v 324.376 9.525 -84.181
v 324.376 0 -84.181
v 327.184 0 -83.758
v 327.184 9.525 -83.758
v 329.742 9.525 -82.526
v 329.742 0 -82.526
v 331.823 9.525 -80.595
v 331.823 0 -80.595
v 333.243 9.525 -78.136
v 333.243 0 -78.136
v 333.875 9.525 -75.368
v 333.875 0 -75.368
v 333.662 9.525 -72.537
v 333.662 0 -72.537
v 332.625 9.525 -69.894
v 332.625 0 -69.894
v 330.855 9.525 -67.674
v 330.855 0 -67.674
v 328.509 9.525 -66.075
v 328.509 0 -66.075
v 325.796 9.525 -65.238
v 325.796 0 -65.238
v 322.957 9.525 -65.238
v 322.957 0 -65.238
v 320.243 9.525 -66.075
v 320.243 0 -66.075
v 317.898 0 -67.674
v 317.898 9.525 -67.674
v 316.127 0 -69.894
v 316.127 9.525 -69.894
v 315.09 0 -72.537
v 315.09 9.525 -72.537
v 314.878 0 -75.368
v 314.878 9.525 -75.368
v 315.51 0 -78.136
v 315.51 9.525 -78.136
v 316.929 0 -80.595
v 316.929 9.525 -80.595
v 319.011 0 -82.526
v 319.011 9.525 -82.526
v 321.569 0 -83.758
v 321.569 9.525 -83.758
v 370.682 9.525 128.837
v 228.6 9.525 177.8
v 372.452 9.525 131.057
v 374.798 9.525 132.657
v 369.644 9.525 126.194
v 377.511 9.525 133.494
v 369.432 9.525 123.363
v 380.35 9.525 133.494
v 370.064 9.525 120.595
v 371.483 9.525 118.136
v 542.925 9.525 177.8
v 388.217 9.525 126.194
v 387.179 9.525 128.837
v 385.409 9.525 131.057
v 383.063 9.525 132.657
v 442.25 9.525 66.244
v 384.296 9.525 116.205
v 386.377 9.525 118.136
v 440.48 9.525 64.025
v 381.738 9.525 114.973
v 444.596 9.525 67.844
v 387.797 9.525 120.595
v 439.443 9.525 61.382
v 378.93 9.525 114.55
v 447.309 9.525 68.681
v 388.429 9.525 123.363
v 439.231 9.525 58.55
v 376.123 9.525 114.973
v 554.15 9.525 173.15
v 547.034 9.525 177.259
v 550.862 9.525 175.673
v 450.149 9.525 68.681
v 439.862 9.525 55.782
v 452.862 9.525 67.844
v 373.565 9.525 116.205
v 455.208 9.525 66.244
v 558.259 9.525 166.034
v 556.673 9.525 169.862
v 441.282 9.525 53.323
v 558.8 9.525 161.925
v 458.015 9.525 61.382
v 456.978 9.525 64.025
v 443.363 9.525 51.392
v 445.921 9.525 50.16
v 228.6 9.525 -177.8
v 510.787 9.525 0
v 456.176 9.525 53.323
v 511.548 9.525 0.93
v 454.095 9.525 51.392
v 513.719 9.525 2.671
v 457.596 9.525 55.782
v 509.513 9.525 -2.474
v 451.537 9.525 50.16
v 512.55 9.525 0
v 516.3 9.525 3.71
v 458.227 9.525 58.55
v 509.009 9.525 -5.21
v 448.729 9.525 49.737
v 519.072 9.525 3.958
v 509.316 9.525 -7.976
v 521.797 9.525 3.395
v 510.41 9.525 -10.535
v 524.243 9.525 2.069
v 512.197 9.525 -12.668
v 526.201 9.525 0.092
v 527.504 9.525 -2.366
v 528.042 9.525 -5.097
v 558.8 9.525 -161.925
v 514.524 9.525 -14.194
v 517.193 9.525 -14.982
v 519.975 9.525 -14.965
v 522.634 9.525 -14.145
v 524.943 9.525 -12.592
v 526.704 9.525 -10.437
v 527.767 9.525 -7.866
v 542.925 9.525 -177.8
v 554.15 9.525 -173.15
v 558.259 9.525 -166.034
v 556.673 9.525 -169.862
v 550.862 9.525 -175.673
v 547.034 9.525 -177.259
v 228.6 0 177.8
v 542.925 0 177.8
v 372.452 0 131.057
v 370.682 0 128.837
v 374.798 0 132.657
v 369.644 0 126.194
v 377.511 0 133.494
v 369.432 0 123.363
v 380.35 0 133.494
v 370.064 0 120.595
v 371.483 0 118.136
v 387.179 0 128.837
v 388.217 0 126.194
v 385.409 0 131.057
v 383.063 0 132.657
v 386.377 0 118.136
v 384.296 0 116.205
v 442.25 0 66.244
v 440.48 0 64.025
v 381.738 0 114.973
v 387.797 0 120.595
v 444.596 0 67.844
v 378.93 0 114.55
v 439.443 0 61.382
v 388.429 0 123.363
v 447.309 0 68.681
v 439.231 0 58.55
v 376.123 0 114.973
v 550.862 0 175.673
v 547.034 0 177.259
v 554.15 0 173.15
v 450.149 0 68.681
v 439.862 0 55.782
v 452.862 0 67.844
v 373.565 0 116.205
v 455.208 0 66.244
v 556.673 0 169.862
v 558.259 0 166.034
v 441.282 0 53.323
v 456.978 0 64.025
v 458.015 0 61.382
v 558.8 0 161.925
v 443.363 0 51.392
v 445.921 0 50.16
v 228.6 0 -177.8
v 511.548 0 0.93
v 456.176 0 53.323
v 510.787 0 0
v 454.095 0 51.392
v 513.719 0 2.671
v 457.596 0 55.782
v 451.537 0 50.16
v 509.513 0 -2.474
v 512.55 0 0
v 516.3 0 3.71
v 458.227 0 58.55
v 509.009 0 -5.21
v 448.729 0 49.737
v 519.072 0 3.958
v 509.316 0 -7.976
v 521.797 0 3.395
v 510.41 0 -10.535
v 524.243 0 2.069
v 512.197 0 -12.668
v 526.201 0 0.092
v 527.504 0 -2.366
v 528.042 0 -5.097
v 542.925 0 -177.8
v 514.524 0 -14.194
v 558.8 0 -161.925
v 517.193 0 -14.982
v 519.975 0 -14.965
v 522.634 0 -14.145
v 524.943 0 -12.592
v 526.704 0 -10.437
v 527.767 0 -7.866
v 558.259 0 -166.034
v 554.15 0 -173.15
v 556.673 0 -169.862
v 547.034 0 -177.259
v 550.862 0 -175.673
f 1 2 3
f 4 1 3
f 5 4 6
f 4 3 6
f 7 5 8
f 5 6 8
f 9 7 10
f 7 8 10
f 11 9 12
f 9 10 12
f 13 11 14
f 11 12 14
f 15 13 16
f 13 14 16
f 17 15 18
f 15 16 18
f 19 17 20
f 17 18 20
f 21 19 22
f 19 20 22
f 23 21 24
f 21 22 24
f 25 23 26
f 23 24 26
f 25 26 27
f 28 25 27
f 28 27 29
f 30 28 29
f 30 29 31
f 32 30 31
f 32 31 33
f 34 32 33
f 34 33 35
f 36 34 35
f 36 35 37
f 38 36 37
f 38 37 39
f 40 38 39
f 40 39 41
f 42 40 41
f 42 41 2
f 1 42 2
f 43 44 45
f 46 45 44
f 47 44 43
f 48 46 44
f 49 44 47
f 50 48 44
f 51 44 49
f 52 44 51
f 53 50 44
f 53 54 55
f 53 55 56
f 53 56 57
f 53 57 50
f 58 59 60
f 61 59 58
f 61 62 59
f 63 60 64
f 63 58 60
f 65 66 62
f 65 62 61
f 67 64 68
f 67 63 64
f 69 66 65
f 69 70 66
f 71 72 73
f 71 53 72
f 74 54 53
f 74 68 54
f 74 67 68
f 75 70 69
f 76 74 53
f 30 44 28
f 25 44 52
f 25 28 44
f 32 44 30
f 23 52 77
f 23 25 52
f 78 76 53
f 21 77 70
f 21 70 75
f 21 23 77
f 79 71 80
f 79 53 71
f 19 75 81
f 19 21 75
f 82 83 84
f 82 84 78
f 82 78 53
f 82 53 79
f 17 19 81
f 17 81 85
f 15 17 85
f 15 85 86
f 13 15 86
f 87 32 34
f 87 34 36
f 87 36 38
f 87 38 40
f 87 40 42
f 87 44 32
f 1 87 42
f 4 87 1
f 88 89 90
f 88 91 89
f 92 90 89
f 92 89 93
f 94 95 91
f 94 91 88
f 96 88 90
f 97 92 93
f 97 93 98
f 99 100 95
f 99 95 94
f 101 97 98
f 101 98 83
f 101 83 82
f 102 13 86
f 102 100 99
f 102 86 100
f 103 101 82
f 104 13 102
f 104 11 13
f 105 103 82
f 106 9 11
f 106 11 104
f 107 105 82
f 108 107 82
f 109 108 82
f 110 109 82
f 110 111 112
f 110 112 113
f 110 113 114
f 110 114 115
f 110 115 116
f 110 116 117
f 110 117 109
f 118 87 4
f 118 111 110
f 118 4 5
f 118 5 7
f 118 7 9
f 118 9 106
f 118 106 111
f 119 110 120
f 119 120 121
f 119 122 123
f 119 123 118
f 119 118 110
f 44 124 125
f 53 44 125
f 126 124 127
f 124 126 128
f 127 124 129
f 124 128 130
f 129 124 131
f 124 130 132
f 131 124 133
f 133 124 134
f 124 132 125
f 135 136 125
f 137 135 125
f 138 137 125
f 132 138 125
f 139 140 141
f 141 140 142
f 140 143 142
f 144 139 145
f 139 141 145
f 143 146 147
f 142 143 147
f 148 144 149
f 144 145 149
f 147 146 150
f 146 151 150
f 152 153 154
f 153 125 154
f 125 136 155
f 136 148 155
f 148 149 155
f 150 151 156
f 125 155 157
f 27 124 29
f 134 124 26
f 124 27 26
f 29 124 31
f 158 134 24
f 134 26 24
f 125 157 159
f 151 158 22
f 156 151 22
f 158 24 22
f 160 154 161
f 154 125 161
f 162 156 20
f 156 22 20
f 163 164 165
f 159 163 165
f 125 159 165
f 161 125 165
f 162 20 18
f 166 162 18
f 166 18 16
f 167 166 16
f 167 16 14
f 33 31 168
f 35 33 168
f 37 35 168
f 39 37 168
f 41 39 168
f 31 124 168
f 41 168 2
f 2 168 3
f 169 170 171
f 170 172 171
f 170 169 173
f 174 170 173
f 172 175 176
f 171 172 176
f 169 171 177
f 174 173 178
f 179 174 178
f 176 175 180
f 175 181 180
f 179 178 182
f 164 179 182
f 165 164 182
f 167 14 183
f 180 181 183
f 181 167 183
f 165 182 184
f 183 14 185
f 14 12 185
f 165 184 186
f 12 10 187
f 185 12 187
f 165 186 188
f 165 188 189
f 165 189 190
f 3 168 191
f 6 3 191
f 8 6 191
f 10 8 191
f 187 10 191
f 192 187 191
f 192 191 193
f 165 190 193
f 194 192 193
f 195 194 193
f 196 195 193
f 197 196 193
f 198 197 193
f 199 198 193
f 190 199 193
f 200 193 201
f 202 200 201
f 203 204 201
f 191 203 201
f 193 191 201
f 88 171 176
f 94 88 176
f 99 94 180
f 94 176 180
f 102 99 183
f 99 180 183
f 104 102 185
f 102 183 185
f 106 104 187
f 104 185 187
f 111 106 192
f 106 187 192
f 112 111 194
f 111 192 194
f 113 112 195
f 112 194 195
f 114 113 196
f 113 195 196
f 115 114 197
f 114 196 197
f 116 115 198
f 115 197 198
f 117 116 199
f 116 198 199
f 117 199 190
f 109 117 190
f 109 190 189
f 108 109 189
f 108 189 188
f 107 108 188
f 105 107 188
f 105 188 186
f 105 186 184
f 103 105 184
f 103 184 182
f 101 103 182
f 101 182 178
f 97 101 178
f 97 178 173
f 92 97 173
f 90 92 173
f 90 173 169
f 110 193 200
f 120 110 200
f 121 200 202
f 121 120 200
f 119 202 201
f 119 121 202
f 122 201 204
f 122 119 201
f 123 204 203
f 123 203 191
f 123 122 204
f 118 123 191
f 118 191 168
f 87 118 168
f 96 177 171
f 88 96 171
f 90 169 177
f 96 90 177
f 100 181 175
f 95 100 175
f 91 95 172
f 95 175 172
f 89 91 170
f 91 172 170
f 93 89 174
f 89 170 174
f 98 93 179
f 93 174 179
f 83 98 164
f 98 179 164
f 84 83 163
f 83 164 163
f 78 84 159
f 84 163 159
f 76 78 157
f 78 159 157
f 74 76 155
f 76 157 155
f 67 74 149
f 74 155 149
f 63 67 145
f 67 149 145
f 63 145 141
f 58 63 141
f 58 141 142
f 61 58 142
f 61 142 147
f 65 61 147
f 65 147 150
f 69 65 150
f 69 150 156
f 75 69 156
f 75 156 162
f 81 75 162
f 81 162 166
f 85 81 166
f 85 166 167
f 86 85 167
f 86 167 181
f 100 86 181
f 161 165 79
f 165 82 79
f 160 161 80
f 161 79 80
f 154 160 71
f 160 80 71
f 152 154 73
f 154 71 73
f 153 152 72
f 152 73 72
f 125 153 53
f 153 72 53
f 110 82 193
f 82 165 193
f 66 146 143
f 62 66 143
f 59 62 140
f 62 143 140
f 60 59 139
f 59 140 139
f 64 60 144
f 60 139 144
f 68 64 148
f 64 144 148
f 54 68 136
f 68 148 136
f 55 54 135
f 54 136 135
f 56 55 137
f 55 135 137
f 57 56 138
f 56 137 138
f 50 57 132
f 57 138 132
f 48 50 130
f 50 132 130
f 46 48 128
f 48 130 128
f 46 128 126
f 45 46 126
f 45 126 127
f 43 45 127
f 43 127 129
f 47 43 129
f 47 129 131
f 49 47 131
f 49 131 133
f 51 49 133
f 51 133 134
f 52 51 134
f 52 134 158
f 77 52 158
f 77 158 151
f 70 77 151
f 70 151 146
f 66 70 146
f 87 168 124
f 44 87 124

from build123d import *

# Parameters (mm, degrees)
BOSS_EXTRUDE1_DEPTH = 9.525
BOSS_EXTRUDE2_DEPTH = 9.525
FILLET1_R           = 15.875
SKETCH3_R           = 9.525
CUT_EXTRUDE1_DEPTH  = 587.481888574


with BuildPart() as part:
    # Sketch1 → Boss-Extrude1 (new body)
    with BuildSketch(Plane(origin=(0, 0, 0), x_dir=(1, 0, 0), z_dir=(0, 1, 0))):
        Polygon((461.512355724, 17.636671785), (558.8, 99.270698215), (558.8, 177.8), (228.6, 177.8), (228.6, -177.8), align=None)
    extrude(amount=BOSS_EXTRUDE1_DEPTH)

    # Sketch1<4> → Boss-Extrude2 (add)
    with BuildSketch(Plane(origin=(0, 0, 0), x_dir=(1, 0, 0), z_dir=(0, 1, 0))):
        Polygon((558.8, -177.8), (558.8, 99.270698215), (461.512355724, 17.636671785), (228.6, -177.8), align=None)
    extrude(amount=BOSS_EXTRUDE2_DEPTH)

    # Fillet1
    fillet1_edges = [part.edges().sort_by_distance(p)[0] for p in [
        (558.8, 4.7625, 177.8),
        (558.8, 4.7625, -177.8),
    ]]
    fillet(fillet1_edges, radius=FILLET1_R)

    # Sketch3 → Cut-Extrude1 (cut, through all)
    with BuildSketch(Plane.XZ):
        with Locations((378.930433901, 124.074982269)):
            Circle(SKETCH3_R)
        with Locations((448.729013979, 59.262015054)):
            Circle(SKETCH3_R)
        with BuildLine():
            Line((511.547736048, 0.930344561), (512.549645575, 0))
            Line((512.549645575, 0), (510.787273965, 0))
            ThreePointArc((510.787273965, 0), (525.902368362, -11.579080306), (511.547736048, 0.930344561))
        make_face()
        with Locations((324.376240195, -74.656356713)):
            Circle(SKETCH3_R)
    extrude(amount=-CUT_EXTRUDE1_DEPTH, mode=Mode.SUBTRACT)


solid = part.part
